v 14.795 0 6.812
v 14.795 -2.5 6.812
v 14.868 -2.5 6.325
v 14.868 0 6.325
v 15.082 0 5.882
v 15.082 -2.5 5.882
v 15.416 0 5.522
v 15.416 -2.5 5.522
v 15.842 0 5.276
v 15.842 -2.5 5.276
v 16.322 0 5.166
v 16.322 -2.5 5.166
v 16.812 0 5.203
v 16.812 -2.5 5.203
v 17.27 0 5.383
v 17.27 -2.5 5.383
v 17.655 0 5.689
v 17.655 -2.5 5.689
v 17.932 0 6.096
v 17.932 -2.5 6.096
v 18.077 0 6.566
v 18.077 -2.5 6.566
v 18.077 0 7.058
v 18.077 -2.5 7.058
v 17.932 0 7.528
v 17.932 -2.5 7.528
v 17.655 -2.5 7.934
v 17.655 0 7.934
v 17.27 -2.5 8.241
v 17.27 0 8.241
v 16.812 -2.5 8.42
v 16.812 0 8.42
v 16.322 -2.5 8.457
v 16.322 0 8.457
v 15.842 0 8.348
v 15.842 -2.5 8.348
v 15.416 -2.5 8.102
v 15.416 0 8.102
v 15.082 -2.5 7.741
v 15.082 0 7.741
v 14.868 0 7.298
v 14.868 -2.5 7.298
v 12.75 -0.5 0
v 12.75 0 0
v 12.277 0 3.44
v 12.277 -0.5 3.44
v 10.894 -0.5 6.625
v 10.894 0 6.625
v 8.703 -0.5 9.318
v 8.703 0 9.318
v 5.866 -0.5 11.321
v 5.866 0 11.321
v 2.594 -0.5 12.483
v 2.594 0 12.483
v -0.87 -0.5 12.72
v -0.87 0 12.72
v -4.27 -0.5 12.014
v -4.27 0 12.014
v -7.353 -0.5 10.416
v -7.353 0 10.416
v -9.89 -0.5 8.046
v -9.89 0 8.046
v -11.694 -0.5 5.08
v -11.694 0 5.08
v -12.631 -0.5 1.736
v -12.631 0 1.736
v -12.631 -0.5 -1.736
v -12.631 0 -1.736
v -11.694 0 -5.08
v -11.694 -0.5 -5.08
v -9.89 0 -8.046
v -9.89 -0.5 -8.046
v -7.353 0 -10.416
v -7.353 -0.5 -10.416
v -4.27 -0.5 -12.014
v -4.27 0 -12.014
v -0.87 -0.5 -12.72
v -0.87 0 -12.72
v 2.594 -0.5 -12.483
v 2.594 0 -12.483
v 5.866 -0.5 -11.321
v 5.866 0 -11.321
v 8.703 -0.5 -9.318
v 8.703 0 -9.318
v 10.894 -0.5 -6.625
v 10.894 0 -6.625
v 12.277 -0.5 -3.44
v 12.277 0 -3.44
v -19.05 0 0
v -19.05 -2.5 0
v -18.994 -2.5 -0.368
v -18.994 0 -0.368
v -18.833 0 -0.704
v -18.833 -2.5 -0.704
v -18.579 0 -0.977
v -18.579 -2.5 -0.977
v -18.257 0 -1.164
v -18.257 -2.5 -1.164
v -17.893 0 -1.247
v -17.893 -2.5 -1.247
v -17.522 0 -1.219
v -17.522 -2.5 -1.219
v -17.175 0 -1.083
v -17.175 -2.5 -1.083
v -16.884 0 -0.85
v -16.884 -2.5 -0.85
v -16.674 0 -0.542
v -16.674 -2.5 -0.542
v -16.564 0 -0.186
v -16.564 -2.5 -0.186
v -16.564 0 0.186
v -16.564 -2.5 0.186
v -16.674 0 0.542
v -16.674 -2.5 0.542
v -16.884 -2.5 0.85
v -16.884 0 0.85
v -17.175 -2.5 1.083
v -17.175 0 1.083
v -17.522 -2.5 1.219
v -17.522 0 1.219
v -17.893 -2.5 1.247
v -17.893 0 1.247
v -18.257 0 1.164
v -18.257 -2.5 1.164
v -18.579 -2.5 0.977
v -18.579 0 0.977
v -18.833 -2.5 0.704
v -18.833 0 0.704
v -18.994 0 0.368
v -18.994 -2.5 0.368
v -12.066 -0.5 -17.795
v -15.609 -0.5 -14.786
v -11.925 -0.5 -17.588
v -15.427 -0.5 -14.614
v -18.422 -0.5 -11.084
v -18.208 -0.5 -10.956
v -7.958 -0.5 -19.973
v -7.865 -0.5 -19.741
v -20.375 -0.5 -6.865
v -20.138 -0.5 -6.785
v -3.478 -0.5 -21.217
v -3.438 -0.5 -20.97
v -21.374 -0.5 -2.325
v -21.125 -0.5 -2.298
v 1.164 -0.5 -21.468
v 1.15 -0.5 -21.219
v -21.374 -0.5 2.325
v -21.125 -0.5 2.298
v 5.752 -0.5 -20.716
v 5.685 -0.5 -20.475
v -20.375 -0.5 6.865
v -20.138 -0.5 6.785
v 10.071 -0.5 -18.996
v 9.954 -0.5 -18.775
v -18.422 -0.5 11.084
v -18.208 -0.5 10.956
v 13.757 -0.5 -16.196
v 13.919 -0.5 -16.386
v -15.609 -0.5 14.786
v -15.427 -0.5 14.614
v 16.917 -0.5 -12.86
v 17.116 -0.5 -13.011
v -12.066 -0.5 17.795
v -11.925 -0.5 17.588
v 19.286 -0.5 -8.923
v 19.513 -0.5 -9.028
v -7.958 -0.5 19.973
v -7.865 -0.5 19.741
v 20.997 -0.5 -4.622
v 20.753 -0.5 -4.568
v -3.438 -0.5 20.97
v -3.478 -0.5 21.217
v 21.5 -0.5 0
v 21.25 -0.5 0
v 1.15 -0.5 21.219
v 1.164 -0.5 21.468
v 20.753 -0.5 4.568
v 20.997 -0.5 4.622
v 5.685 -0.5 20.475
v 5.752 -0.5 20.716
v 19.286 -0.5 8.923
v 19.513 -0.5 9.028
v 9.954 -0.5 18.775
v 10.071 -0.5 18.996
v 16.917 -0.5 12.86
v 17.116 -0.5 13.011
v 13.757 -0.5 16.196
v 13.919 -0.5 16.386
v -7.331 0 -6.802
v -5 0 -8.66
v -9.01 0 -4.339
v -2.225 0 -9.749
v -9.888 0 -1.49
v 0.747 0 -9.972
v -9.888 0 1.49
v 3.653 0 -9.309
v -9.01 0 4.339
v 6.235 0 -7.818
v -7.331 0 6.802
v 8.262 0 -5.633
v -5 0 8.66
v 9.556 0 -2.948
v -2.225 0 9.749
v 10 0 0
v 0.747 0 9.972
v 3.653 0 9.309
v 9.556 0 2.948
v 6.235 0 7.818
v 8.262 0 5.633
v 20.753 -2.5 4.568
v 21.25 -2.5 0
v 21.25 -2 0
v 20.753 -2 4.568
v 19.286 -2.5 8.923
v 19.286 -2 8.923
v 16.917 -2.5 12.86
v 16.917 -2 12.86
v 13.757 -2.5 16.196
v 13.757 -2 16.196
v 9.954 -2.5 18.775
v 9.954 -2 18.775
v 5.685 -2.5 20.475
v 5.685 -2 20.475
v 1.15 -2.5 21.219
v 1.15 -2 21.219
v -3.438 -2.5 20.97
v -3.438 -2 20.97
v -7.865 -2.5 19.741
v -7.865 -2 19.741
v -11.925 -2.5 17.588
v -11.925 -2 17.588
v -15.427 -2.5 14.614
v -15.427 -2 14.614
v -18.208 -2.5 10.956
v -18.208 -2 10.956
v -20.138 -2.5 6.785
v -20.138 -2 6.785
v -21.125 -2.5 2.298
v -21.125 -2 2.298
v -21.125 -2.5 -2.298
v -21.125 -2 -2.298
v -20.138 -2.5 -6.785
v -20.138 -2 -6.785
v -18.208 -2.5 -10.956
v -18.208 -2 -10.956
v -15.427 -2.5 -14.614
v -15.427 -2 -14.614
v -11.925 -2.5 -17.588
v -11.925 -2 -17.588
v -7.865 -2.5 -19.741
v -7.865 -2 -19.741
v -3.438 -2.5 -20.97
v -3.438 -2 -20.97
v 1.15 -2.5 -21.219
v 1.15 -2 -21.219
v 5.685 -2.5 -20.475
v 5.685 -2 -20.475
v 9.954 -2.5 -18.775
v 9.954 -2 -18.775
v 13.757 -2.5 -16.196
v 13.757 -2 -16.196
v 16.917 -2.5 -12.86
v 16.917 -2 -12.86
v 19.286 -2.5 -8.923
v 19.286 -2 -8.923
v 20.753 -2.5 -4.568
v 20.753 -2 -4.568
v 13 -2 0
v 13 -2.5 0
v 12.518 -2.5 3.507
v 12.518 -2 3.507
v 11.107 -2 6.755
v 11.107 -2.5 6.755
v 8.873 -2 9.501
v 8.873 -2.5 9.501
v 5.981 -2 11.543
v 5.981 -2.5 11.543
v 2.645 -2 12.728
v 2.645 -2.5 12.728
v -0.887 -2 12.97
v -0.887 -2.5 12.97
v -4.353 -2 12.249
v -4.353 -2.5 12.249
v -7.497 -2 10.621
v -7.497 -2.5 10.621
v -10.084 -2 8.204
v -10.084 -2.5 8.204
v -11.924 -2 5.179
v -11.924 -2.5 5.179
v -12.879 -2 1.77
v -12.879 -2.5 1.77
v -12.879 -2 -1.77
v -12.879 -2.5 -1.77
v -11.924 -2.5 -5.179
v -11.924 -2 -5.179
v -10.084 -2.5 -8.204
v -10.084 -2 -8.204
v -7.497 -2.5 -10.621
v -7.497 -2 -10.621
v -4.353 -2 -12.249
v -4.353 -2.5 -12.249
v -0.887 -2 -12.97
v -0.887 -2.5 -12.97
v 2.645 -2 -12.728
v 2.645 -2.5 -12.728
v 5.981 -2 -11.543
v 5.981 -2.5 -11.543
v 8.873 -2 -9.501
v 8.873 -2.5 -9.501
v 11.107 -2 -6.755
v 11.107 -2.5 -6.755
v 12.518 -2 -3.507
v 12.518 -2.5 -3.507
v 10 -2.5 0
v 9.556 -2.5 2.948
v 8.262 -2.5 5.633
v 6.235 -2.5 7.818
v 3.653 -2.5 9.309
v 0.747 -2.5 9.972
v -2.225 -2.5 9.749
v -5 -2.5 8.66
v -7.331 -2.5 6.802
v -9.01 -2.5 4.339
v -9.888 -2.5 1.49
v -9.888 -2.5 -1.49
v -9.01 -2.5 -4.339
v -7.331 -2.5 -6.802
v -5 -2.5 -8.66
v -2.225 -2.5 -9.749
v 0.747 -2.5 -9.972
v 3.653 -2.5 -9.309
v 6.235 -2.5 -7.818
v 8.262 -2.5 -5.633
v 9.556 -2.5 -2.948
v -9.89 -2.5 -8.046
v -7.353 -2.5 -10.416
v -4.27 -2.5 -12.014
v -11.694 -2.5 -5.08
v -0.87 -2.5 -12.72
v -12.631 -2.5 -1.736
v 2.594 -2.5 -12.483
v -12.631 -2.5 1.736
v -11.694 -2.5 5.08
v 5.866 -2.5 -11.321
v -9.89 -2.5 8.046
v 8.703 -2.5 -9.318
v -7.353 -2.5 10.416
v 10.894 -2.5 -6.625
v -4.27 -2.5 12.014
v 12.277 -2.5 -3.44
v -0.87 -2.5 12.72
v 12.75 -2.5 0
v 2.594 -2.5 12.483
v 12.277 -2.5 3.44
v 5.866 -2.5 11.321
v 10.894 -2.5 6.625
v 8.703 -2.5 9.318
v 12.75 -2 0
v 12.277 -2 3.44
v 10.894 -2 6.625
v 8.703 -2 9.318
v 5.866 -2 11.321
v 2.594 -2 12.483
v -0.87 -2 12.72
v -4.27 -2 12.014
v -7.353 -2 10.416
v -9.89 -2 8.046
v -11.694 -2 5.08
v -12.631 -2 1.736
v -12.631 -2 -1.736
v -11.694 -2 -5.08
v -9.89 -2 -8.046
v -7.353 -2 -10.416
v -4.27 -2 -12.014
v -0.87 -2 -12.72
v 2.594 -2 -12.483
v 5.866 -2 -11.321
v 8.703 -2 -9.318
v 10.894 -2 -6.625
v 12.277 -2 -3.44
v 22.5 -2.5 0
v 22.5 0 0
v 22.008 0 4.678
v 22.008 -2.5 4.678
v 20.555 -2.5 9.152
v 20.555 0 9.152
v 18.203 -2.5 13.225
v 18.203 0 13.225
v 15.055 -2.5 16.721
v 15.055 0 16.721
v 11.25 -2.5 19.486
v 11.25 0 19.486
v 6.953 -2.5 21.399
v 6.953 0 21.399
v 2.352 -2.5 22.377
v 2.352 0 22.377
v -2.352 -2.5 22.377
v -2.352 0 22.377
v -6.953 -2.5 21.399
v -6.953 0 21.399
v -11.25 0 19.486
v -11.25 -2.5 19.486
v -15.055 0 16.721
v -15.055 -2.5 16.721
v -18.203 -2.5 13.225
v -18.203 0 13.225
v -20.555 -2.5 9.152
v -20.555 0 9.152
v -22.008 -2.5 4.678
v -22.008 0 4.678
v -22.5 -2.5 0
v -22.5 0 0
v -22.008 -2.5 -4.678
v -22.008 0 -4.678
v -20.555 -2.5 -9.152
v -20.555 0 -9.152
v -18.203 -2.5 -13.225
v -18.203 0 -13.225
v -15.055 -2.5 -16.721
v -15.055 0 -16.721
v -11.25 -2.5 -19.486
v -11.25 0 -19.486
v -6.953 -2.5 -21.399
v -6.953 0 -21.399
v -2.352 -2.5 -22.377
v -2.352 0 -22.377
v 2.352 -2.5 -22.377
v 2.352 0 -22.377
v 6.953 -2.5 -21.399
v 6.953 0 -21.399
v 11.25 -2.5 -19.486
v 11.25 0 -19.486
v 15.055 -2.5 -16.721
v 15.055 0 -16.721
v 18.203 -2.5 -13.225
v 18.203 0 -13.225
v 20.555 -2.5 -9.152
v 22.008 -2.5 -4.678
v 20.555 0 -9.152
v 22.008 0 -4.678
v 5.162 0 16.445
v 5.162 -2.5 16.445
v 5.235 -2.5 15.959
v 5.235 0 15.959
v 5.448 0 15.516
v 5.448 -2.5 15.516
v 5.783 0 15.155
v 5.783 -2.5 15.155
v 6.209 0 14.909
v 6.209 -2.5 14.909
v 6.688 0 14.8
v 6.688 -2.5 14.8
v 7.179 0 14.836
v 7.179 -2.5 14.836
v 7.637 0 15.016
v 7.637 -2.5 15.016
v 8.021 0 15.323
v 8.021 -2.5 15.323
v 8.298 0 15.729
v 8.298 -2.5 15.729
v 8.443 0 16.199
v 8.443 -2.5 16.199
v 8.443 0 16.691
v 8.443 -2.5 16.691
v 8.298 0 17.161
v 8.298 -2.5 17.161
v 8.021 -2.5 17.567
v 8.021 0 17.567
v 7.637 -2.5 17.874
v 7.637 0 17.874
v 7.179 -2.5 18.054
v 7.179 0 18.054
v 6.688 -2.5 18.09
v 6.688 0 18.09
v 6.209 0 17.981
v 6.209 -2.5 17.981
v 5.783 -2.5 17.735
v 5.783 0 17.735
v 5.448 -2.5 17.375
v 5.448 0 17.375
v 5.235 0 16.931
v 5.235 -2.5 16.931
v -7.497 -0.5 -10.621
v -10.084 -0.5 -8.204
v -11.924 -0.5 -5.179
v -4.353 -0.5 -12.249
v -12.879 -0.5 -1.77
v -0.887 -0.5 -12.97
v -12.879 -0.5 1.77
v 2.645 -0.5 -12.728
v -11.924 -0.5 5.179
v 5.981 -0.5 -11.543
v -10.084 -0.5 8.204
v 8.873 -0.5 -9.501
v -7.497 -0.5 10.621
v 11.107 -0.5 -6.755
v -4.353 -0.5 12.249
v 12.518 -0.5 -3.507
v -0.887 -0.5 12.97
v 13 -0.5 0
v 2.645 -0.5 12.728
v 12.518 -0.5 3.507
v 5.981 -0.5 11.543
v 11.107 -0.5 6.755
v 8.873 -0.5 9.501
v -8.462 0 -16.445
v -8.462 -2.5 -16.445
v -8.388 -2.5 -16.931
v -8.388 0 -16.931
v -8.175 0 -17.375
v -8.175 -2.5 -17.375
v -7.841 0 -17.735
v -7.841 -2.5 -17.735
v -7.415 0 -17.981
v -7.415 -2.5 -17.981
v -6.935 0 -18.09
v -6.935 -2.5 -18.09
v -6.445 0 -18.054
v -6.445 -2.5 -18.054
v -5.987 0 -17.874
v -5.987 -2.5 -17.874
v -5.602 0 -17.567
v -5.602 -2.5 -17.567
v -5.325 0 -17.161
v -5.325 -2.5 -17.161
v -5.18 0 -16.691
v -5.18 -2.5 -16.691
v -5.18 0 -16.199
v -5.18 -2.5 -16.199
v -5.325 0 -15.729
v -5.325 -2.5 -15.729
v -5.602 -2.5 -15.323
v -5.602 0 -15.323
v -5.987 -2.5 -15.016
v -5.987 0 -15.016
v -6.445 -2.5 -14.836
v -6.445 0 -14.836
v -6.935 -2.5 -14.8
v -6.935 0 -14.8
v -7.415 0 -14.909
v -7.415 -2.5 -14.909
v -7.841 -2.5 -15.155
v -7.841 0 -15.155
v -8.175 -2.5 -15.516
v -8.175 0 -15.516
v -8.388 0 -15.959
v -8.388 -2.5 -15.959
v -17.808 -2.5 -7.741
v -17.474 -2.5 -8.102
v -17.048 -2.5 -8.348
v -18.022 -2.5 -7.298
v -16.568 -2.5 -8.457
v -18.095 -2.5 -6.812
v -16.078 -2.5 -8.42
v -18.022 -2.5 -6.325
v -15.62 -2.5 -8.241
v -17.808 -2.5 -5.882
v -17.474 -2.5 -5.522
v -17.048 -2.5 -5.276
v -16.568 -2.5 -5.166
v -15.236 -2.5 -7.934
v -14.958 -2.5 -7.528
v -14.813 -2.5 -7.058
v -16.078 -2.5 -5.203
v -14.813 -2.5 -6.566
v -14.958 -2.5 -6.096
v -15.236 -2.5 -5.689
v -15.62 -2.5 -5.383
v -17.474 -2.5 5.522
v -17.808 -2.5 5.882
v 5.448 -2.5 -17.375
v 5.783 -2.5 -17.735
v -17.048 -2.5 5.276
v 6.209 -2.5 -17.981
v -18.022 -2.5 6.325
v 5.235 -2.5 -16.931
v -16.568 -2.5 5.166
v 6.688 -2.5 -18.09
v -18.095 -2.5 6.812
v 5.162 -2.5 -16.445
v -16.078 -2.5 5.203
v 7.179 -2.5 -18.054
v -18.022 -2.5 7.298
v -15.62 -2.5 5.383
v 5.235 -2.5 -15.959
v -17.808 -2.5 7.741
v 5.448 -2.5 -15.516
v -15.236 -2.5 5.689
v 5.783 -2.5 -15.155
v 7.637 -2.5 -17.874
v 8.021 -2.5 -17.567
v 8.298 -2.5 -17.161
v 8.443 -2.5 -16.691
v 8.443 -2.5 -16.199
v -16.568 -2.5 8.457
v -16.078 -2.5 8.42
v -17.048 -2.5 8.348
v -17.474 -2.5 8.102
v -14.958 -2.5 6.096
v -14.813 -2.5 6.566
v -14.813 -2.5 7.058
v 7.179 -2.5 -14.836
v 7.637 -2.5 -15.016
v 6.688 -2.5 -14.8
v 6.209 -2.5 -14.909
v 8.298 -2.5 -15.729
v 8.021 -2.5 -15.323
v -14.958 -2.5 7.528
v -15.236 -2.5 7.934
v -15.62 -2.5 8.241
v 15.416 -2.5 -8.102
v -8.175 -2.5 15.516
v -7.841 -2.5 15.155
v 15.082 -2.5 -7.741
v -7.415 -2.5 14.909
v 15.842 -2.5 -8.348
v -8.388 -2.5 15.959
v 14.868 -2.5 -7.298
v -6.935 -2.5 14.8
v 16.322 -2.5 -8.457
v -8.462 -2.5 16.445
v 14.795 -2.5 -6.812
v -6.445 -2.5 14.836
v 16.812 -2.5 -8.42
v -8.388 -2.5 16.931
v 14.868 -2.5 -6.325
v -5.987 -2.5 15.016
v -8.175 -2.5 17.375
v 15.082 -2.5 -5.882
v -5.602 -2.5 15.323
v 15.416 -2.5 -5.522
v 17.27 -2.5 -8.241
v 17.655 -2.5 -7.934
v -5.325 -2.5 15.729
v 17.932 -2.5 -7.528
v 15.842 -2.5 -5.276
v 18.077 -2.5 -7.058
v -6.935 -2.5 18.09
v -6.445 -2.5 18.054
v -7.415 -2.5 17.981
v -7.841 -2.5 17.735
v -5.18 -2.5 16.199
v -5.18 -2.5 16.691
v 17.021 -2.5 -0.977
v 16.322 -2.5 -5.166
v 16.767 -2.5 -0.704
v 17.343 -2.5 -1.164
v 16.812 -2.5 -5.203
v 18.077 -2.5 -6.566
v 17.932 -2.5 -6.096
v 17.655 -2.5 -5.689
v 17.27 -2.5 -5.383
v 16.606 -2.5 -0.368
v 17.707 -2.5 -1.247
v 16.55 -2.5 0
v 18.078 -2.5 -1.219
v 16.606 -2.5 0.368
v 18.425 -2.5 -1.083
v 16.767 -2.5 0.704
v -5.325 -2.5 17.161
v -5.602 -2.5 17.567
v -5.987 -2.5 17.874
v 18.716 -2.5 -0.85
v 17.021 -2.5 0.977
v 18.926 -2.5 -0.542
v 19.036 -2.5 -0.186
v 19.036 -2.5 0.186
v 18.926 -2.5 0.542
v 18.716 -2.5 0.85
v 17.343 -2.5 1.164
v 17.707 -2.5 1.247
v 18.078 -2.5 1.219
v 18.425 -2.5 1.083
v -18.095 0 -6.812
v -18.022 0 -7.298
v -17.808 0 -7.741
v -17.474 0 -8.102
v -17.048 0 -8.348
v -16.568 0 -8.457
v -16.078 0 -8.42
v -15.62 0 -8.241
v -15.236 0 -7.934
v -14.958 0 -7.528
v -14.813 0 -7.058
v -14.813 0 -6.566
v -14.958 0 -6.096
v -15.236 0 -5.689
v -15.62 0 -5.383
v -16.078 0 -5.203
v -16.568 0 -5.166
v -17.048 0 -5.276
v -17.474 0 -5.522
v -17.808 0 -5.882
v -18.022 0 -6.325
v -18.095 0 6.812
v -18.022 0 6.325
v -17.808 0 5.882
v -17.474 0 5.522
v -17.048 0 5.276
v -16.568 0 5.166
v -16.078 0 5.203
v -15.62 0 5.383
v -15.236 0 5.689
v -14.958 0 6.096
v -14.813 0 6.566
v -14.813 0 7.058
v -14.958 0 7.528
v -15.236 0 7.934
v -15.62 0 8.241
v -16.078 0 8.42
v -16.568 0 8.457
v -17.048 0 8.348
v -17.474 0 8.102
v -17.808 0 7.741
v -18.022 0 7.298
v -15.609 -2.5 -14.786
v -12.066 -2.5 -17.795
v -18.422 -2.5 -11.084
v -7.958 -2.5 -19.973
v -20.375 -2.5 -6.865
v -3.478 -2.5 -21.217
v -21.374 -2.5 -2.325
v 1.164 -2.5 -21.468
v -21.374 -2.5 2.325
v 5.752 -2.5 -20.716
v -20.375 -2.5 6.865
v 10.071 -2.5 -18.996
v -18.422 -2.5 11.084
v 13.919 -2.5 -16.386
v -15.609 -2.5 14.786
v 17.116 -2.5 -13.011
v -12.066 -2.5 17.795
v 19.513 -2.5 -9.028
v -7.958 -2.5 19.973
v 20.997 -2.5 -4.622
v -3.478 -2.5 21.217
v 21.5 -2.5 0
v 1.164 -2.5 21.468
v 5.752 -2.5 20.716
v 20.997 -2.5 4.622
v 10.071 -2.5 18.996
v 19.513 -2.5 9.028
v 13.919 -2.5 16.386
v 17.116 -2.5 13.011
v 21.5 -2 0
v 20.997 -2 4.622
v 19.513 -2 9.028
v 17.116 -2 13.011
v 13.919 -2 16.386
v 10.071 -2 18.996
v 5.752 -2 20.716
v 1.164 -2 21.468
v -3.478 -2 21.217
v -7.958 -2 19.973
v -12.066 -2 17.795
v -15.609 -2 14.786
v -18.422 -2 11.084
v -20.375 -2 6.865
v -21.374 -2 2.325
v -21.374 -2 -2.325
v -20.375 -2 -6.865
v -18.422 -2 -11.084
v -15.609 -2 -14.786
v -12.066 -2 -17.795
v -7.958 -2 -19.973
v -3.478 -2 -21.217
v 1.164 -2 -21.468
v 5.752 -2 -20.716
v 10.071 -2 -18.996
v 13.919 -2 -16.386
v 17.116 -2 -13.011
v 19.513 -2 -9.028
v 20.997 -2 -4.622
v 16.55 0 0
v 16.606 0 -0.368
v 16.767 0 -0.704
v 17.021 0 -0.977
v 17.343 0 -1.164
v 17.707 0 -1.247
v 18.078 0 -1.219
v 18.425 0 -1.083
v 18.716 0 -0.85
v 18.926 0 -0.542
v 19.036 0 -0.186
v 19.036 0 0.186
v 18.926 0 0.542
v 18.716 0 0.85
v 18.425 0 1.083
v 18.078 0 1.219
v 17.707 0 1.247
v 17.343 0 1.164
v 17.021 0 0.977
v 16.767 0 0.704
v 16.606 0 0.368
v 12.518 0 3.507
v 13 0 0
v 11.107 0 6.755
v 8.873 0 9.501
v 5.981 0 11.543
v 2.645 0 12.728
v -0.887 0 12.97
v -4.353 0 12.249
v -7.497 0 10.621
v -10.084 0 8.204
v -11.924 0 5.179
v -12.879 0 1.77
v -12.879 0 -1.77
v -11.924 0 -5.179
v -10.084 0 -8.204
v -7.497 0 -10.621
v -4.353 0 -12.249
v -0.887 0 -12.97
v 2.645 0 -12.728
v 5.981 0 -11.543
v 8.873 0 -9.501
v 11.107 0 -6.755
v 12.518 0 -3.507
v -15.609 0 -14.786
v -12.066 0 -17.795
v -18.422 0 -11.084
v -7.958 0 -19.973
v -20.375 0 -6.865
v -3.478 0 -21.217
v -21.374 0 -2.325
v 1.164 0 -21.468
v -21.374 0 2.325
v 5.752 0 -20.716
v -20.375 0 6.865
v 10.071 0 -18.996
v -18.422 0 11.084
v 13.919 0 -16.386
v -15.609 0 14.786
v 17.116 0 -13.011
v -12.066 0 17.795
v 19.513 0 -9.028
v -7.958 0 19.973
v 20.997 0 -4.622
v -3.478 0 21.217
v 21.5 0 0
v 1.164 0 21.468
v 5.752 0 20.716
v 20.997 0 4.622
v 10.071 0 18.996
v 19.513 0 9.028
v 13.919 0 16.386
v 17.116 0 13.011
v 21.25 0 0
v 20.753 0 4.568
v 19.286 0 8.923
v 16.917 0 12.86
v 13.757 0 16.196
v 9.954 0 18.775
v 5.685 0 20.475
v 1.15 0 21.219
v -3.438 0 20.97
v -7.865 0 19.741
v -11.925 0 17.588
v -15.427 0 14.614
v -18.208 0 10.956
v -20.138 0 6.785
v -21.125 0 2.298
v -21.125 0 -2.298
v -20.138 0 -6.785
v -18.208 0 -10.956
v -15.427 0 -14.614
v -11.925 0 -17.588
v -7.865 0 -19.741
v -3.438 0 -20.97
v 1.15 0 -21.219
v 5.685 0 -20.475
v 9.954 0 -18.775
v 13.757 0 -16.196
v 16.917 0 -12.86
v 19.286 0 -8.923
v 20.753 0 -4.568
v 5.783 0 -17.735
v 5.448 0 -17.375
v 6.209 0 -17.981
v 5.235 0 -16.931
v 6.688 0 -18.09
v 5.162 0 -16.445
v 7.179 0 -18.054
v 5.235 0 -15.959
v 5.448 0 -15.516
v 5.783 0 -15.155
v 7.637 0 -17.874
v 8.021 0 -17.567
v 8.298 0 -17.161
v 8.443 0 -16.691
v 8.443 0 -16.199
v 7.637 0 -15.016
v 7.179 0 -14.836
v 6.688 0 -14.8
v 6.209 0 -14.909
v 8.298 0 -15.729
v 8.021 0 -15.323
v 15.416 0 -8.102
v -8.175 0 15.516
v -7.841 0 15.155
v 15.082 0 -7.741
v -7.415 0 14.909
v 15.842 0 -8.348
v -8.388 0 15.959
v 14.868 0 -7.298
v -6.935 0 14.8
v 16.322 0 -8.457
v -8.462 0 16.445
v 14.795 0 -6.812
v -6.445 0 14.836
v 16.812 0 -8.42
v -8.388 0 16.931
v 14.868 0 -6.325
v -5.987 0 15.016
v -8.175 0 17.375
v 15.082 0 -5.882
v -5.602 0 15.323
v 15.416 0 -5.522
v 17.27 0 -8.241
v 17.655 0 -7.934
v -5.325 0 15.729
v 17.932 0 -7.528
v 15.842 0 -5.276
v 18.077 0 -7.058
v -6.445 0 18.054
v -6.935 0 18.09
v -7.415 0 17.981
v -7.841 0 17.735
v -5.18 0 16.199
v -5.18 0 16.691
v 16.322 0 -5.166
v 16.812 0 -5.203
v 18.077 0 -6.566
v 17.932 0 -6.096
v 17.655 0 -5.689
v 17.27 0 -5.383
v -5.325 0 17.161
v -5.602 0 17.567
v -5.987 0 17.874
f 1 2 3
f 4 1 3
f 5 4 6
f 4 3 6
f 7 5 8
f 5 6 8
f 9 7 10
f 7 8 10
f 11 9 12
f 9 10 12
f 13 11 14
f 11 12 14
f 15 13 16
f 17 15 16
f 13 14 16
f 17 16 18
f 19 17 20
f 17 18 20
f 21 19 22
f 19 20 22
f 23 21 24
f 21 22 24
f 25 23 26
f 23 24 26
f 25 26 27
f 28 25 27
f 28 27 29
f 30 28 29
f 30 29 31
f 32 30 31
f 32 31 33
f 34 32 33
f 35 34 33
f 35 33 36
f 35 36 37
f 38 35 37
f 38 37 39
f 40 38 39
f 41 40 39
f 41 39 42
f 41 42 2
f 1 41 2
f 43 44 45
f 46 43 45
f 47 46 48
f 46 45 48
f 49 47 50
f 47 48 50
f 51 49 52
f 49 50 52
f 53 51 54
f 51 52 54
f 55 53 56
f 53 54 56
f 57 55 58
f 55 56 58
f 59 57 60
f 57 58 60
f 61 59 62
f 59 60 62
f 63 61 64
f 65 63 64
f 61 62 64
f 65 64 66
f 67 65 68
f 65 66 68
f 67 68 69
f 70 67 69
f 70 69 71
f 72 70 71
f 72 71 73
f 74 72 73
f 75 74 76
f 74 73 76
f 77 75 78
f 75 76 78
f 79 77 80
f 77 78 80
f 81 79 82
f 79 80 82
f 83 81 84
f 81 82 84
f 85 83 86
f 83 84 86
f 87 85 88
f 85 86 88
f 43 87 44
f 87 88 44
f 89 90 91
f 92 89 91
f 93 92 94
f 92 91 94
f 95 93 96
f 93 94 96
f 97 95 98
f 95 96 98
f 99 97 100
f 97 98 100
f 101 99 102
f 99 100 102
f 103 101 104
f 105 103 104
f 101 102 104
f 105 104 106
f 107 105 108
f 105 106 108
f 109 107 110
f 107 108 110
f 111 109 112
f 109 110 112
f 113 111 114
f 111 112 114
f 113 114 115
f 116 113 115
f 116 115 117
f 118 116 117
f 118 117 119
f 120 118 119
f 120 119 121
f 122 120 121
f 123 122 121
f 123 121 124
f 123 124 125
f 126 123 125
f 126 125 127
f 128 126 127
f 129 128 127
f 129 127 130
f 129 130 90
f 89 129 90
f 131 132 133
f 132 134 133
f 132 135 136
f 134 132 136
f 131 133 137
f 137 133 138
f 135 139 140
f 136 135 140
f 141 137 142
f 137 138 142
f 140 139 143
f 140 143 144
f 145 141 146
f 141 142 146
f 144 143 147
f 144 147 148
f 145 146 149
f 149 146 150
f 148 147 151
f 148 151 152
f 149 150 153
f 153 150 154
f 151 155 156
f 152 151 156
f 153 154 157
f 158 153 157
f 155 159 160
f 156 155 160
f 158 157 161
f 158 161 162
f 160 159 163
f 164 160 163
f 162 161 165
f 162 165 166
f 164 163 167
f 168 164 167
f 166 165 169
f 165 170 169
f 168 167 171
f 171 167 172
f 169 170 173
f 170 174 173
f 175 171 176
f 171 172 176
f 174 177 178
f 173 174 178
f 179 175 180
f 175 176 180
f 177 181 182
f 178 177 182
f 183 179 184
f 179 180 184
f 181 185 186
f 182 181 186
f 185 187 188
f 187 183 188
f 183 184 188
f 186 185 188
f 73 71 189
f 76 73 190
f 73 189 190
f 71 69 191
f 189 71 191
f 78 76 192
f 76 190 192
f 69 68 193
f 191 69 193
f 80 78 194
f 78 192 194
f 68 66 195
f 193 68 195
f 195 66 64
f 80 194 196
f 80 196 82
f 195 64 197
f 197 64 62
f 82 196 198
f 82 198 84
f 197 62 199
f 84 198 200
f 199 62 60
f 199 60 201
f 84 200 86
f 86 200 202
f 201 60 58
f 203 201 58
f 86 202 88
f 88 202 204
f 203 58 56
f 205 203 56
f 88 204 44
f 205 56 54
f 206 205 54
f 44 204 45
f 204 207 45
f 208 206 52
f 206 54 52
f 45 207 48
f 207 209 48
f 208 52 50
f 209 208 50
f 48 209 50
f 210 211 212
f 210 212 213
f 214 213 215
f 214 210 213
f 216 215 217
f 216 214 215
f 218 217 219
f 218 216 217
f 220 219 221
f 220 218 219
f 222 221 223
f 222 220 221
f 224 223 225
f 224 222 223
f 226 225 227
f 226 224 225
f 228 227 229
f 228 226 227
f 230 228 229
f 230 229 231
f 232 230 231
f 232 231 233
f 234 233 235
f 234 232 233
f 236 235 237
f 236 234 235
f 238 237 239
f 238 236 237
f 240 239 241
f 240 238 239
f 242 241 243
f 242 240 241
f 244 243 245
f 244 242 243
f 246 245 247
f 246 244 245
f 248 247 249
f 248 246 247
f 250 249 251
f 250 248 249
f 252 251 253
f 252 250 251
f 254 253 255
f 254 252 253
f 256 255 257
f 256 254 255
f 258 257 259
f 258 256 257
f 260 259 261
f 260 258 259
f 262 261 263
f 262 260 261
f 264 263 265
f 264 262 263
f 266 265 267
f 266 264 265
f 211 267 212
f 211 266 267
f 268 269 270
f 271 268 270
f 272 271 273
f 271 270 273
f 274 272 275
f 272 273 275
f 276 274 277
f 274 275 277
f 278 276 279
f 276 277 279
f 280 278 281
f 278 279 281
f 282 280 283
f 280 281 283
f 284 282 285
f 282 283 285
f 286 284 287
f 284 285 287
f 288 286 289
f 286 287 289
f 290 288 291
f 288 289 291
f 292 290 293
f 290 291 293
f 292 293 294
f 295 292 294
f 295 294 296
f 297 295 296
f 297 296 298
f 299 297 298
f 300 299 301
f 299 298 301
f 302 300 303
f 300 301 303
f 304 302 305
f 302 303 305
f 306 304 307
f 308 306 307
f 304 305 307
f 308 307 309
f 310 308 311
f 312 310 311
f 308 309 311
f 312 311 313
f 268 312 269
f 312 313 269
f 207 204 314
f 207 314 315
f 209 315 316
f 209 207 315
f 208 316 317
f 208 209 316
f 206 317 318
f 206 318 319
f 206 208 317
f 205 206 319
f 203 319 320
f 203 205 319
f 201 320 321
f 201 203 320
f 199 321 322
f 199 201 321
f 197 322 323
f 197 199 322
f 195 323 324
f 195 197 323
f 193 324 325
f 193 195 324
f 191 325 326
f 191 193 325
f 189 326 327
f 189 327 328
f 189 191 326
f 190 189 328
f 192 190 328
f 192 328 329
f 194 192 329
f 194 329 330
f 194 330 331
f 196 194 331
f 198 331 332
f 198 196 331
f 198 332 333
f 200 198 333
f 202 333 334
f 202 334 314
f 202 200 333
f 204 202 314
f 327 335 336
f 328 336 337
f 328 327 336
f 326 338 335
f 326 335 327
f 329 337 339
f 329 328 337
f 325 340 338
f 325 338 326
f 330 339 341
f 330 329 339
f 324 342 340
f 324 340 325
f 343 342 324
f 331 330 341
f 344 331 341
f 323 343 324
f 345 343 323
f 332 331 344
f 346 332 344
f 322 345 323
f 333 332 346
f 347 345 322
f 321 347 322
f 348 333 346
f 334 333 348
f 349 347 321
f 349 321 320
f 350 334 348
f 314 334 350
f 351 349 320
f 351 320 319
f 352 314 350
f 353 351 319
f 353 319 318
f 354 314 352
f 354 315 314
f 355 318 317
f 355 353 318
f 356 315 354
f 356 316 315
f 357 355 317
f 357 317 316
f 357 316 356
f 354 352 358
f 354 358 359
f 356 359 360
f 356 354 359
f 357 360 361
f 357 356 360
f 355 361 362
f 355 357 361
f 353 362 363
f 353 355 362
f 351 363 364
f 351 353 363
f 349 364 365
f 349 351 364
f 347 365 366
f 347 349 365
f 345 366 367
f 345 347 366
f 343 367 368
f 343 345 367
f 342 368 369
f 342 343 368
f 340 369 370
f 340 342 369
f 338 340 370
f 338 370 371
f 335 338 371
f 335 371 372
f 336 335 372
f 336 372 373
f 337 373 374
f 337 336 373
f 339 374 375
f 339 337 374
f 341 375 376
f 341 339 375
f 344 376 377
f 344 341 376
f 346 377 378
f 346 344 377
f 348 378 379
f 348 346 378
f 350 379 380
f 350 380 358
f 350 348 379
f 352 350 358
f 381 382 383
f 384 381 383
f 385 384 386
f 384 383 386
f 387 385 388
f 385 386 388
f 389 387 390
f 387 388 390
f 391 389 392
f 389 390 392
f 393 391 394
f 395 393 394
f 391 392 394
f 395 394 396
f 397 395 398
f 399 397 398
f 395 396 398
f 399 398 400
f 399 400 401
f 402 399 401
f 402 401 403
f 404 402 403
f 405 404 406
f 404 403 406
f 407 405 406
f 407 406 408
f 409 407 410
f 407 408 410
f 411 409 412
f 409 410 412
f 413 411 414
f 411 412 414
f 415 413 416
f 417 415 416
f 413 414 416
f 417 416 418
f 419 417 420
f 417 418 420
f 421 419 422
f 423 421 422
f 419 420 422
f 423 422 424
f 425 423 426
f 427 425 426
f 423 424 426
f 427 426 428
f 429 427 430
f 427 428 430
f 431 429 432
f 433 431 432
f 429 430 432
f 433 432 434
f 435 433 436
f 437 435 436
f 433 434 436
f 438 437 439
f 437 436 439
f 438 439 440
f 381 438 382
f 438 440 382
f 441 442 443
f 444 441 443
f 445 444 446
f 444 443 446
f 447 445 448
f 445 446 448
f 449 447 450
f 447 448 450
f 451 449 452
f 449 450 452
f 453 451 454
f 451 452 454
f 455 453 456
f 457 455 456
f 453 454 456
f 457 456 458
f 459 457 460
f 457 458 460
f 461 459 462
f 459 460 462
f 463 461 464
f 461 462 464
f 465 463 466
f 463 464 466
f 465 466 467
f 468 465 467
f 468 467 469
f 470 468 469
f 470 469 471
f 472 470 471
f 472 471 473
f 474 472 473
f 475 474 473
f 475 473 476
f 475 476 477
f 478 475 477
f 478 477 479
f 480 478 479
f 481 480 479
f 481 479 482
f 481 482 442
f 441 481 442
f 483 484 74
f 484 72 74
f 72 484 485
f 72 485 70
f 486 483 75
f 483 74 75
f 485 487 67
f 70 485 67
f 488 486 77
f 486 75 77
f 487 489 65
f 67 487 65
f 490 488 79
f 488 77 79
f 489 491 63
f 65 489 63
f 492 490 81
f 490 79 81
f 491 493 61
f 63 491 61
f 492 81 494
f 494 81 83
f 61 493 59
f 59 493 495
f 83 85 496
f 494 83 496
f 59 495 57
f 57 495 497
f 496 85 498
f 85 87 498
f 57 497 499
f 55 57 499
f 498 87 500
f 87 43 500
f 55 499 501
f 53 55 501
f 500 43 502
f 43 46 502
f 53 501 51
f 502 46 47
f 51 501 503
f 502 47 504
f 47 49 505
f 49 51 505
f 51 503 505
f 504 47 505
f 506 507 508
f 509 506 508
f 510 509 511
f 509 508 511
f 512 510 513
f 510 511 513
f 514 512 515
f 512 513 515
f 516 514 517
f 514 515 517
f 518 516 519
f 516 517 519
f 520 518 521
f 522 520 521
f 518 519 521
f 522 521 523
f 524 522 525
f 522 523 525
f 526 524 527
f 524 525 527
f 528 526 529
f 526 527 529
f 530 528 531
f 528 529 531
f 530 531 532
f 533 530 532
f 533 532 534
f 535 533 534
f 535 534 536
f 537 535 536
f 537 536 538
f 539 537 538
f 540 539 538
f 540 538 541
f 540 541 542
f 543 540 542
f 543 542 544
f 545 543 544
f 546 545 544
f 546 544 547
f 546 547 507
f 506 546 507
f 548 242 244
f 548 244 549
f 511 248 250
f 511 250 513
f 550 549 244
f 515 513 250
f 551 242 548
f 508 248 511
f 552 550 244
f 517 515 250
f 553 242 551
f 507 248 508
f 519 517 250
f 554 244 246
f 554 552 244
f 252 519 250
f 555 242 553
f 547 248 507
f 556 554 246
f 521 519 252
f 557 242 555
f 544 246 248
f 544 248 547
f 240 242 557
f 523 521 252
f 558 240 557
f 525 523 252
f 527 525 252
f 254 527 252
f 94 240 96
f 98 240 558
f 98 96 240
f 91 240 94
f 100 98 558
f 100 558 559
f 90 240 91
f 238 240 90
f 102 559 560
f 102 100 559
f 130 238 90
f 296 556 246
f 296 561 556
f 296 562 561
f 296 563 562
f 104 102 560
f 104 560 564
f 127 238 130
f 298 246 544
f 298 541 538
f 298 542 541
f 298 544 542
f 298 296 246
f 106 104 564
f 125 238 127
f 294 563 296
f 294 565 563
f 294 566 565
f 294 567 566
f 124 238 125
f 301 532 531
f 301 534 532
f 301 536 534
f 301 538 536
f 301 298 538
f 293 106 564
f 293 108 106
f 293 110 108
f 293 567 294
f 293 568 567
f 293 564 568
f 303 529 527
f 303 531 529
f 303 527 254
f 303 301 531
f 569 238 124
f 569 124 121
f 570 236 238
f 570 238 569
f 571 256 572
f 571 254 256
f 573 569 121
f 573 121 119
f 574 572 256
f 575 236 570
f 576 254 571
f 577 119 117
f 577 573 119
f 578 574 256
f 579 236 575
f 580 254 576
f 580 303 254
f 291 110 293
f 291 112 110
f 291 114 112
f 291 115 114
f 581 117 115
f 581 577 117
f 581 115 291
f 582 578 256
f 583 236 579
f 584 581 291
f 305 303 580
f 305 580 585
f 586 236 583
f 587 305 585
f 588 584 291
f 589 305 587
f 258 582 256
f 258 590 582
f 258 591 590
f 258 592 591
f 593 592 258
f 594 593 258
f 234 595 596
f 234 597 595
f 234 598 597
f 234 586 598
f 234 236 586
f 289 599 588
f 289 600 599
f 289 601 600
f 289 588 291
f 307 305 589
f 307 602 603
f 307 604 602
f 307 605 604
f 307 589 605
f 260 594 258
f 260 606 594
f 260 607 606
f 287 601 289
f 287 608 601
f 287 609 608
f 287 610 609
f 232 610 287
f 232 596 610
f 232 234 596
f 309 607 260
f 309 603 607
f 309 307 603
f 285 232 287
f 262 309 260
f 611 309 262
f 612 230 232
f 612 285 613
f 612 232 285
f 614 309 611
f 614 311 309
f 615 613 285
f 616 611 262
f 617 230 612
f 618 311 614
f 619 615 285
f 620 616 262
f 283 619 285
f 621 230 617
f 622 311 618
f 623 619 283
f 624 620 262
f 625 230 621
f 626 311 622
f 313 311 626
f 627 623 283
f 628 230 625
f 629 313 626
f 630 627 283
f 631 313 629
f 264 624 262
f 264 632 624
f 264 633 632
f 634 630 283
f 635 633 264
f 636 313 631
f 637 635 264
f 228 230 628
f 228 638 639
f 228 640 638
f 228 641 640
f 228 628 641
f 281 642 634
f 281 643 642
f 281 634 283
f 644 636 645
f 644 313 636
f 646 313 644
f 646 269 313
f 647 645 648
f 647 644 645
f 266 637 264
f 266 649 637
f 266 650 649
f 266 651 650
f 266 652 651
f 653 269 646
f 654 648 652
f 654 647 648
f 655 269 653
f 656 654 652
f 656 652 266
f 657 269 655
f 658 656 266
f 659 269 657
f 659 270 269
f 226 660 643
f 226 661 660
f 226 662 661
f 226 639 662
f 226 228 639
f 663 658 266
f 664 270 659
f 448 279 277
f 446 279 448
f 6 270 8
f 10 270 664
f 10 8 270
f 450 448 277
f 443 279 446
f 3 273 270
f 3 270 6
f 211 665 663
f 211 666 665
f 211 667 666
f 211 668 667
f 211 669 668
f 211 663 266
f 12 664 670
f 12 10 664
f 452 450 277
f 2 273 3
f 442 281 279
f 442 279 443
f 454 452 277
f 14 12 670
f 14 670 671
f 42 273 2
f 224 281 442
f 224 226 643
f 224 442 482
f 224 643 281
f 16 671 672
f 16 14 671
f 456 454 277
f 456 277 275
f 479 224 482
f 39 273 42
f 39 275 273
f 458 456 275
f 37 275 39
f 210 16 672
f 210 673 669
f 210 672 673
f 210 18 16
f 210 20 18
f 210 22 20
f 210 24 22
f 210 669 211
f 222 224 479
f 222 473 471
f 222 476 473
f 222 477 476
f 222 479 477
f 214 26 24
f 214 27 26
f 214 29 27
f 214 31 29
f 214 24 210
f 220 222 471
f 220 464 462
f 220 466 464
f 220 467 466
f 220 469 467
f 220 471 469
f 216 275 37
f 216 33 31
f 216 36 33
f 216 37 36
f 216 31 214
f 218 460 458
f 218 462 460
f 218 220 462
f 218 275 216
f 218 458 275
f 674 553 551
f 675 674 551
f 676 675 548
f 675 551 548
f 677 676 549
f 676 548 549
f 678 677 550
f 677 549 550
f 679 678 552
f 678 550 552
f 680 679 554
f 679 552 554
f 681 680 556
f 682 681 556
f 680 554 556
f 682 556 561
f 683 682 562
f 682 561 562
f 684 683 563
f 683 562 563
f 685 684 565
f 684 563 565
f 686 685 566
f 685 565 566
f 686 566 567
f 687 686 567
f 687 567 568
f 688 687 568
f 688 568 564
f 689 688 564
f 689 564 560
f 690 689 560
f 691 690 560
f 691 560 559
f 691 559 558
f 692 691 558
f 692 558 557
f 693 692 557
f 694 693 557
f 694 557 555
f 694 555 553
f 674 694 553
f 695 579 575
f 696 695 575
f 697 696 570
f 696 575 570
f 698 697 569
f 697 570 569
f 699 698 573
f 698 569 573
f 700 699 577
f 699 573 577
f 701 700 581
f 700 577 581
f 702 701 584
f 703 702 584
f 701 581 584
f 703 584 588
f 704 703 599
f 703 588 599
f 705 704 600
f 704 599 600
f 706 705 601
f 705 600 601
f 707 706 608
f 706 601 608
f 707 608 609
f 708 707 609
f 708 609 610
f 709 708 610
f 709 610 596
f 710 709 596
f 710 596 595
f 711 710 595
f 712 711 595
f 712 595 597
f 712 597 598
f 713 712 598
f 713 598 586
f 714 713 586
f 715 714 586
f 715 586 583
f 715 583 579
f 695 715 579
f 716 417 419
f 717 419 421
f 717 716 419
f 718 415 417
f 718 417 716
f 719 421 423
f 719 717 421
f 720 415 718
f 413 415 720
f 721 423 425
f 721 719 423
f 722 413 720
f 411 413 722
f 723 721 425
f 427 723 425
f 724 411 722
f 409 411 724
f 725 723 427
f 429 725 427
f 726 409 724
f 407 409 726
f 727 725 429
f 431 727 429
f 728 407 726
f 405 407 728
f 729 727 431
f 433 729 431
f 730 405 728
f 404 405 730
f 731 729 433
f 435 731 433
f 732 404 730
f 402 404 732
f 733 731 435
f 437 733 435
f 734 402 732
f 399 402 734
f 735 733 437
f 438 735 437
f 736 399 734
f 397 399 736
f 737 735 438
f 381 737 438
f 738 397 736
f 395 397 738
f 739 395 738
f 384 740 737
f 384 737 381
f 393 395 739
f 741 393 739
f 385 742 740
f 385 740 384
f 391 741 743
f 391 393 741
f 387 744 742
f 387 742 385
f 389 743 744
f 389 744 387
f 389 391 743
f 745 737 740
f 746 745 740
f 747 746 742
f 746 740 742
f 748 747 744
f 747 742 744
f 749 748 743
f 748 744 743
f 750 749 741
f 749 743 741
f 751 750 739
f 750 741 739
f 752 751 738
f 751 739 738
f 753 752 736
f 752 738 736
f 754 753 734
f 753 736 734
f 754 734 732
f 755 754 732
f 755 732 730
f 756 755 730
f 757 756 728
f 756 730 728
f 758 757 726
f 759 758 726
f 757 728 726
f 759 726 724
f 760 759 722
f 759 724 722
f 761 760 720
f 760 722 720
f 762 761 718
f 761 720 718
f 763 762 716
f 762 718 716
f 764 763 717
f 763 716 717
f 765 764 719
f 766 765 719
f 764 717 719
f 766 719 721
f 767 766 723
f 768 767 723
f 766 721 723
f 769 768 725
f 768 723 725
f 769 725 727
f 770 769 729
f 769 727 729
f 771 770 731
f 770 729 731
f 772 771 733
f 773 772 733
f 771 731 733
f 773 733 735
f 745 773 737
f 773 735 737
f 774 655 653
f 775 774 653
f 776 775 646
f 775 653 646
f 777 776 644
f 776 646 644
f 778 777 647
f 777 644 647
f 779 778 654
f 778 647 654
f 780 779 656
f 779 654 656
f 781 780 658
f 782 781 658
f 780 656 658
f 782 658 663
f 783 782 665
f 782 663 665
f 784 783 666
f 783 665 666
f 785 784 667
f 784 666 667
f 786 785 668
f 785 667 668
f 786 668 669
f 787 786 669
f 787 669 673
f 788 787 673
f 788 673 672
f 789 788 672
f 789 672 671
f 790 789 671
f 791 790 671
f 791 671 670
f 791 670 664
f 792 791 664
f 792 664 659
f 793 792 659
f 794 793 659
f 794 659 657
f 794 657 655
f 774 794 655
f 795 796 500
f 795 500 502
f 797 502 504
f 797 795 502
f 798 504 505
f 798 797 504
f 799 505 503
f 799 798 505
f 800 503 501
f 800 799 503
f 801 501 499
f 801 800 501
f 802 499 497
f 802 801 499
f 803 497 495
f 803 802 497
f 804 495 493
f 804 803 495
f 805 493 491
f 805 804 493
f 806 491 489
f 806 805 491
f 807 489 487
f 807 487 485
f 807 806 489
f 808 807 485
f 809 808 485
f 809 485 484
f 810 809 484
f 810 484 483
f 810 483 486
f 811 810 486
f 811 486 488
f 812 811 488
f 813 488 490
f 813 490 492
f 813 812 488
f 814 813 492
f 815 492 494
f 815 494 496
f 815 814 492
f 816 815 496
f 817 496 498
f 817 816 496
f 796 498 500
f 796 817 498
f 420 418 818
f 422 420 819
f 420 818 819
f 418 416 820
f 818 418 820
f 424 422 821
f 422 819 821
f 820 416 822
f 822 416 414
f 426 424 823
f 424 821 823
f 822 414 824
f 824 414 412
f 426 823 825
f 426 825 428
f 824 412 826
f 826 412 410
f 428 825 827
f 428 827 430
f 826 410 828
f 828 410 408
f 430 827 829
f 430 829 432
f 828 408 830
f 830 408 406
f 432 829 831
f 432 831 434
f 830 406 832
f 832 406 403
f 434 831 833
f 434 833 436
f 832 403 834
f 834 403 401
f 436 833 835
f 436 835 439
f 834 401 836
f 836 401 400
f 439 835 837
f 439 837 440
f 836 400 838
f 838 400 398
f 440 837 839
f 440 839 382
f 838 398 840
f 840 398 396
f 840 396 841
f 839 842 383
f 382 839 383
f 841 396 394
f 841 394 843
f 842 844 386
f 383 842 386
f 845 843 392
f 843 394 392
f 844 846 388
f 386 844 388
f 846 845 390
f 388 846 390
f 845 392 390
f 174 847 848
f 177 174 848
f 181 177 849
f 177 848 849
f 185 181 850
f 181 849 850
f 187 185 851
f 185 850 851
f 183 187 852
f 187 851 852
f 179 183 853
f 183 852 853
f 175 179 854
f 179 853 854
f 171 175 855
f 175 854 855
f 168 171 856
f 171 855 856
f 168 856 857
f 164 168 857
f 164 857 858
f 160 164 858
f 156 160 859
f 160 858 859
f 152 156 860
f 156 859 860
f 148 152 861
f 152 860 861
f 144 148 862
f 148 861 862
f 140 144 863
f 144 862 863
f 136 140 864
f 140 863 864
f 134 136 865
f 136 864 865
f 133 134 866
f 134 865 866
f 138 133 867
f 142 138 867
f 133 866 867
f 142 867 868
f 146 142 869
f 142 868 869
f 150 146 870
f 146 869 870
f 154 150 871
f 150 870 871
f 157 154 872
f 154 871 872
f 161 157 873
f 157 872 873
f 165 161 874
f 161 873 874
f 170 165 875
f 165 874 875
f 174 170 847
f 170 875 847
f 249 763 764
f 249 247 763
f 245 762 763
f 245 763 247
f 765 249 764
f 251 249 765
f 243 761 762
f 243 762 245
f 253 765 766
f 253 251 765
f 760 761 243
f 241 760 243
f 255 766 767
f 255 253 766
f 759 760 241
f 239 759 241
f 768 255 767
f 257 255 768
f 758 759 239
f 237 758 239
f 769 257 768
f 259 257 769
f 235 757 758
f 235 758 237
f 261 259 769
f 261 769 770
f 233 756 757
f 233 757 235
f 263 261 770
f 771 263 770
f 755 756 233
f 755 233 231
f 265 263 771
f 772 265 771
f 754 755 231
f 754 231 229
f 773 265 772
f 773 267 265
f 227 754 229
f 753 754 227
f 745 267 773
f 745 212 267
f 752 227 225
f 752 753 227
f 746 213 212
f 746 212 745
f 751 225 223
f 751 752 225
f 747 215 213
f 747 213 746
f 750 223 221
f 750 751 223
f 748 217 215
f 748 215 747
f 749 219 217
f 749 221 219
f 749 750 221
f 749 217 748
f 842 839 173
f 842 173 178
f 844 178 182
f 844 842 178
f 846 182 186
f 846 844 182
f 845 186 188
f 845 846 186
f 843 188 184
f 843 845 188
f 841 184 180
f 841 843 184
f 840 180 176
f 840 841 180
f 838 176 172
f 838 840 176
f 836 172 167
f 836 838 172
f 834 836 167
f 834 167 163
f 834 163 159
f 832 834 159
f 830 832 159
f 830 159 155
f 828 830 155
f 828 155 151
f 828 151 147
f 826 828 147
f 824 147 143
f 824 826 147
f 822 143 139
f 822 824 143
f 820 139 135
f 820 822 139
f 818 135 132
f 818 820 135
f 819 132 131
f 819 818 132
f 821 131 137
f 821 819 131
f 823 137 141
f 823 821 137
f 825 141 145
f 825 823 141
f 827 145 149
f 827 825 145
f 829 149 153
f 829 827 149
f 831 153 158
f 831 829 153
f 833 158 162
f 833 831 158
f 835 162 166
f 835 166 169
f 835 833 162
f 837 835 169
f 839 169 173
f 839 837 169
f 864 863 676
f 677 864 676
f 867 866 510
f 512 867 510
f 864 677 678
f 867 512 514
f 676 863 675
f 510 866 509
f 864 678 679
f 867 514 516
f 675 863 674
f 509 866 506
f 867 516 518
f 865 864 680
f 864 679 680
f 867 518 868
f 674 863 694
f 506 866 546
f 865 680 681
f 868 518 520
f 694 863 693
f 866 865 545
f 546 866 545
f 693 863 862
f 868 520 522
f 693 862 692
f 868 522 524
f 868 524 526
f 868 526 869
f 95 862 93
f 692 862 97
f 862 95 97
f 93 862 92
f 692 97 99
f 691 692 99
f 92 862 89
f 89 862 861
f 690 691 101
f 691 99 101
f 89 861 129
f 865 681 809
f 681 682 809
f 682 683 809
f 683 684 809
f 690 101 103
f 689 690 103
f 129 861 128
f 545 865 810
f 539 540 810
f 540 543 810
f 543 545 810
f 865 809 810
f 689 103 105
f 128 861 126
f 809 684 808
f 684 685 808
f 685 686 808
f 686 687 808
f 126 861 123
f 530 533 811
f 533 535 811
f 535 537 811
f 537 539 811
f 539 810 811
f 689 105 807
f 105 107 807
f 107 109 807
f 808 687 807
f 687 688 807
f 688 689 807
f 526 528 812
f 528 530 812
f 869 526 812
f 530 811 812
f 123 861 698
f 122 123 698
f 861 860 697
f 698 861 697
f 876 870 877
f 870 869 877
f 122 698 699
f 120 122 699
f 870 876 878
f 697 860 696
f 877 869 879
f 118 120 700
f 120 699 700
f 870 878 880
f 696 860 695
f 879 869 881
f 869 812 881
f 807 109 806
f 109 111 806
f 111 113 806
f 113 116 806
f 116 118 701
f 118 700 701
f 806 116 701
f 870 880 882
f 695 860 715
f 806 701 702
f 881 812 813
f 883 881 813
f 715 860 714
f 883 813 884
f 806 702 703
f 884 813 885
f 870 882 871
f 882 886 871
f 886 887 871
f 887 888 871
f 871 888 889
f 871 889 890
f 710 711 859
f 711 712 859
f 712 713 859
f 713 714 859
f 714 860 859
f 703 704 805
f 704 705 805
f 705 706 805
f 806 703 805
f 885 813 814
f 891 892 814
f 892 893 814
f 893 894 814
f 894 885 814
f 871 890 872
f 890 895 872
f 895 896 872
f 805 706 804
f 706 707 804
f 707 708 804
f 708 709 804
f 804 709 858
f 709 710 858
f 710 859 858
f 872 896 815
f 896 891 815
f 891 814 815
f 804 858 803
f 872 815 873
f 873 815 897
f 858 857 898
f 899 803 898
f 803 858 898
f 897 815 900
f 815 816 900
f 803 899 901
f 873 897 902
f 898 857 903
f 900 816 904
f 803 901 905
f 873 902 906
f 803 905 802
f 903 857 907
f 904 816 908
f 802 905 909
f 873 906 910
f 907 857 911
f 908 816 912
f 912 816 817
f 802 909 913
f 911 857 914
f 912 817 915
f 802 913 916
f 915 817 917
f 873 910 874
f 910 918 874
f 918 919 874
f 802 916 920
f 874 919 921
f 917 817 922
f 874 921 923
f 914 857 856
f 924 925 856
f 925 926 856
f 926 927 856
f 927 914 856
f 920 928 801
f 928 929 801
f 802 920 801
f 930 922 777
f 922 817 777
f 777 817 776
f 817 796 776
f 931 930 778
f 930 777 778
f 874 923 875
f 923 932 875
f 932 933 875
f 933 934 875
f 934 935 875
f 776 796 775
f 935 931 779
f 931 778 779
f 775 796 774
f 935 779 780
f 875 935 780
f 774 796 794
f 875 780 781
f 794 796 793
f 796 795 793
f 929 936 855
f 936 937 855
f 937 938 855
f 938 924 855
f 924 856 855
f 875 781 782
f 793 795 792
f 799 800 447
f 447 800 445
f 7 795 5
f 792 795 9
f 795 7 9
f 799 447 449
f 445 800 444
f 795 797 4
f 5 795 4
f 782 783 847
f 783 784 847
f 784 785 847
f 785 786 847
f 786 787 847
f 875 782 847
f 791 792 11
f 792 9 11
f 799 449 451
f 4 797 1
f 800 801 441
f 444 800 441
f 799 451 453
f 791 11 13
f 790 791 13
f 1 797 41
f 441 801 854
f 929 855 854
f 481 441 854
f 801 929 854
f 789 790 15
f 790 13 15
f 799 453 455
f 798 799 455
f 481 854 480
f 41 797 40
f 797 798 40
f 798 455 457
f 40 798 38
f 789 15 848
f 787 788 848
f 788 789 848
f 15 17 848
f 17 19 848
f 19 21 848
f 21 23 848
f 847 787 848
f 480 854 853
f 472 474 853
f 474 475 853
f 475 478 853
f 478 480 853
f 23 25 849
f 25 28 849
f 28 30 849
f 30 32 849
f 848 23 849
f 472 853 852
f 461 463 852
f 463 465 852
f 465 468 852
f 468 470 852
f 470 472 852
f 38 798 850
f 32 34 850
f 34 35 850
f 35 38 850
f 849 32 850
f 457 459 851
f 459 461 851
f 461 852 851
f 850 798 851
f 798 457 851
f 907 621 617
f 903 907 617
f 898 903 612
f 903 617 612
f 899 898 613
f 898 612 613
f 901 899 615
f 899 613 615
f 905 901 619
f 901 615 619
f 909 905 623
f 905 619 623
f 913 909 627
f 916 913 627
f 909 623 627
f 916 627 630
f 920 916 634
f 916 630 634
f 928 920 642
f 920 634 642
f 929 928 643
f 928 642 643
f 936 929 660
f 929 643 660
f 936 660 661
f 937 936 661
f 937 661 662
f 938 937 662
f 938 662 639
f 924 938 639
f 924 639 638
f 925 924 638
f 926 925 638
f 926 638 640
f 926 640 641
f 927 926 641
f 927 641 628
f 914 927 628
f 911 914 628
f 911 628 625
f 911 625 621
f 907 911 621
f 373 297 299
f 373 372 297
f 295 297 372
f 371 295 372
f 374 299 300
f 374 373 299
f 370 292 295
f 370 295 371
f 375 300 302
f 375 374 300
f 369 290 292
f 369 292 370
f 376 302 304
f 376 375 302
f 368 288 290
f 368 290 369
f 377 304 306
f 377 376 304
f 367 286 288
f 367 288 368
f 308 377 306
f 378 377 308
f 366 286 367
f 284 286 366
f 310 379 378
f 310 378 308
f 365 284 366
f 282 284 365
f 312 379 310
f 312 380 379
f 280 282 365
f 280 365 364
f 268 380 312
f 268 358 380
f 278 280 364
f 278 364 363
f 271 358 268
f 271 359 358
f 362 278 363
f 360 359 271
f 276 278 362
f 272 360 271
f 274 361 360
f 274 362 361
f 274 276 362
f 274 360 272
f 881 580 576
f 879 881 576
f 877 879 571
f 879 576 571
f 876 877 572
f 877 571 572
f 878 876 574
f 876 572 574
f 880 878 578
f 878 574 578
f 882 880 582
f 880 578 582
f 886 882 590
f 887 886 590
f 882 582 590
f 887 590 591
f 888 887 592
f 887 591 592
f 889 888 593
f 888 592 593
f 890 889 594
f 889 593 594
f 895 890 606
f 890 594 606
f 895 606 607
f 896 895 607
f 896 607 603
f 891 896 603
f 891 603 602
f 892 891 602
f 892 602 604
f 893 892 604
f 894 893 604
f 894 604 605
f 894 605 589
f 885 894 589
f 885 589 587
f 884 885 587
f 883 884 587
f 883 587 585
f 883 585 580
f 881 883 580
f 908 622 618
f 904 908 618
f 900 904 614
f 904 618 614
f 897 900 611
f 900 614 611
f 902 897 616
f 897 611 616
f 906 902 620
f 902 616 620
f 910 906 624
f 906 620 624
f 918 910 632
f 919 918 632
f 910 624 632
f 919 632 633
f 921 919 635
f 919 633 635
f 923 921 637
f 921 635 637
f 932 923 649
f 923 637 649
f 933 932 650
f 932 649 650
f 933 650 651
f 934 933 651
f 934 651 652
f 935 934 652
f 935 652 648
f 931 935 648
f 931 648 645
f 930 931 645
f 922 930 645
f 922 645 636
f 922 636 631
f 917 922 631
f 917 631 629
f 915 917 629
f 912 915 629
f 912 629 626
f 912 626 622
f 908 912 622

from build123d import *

# Parameters (mm, degrees)
F0_R     = 22.5
F0_R_2   = 10
F1_DEPTH = 2.5
F2_D     = 3.3
F3_D     = 2.5
F4_R     = 21.5
F4_R_2   = 21.25
F4_R_3   = 13
F4_R_4   = 12.75
F5_DEPTH = 0.5
F6_R     = 21.5
F6_R_2   = 21.25
F6_R_3   = 13
F6_R_4   = 12.75
F7_DEPTH = 0.5


with BuildPart() as f1:
    # F0 (on Front) → F1 (new body)
    with BuildSketch(Plane.XZ):
        Circle(F0_R)
        Circle(F0_R_2, mode=Mode.SUBTRACT)
    extrude(amount=F1_DEPTH)

    # F2 (through all)
    with Locations(Plane(origin=(0, 0, 0), x_dir=(1, 0, 0), z_dir=(0, 1, 0))):
        with Locations((-16.4450556787, -6.8117650961), (-6.8117650961, -16.4450556787), (6.8117650961, -16.4450556787), (16.4450556787, -6.8117650961), (16.4450556787, 6.8117650961), (6.8117650961, 16.4450556787), (-6.8117650961, 16.4450556787), (-16.4450556787, 6.8117650961)):
            Hole(F2_D / 2)

    # F3 (through all)
    with Locations(Plane(origin=(0, 0, 0), x_dir=(1, 0, 0), z_dir=(0, 1, 0))):
        with Locations((-17.8, 0), (17.8, 0)):
            Hole(F3_D / 2)

    # F4 (on face) → F5 (cut)
    with BuildSketch(Plane.XZ.offset(2.5)):
        Circle(F4_R)
        Circle(F4_R_2, mode=Mode.SUBTRACT)
        Circle(F4_R_3)
        Circle(F4_R_4, mode=Mode.SUBTRACT)
    extrude(amount=-F5_DEPTH, mode=Mode.SUBTRACT)

    # F6 (on face) → F7 (cut)
    with BuildSketch(Plane.XZ):
        Circle(F6_R)
        Circle(F6_R_2, mode=Mode.SUBTRACT)
        Circle(F6_R_3)
        Circle(F6_R_4, mode=Mode.SUBTRACT)
    extrude(amount=F7_DEPTH, mode=Mode.SUBTRACT)


solid = f1.part
